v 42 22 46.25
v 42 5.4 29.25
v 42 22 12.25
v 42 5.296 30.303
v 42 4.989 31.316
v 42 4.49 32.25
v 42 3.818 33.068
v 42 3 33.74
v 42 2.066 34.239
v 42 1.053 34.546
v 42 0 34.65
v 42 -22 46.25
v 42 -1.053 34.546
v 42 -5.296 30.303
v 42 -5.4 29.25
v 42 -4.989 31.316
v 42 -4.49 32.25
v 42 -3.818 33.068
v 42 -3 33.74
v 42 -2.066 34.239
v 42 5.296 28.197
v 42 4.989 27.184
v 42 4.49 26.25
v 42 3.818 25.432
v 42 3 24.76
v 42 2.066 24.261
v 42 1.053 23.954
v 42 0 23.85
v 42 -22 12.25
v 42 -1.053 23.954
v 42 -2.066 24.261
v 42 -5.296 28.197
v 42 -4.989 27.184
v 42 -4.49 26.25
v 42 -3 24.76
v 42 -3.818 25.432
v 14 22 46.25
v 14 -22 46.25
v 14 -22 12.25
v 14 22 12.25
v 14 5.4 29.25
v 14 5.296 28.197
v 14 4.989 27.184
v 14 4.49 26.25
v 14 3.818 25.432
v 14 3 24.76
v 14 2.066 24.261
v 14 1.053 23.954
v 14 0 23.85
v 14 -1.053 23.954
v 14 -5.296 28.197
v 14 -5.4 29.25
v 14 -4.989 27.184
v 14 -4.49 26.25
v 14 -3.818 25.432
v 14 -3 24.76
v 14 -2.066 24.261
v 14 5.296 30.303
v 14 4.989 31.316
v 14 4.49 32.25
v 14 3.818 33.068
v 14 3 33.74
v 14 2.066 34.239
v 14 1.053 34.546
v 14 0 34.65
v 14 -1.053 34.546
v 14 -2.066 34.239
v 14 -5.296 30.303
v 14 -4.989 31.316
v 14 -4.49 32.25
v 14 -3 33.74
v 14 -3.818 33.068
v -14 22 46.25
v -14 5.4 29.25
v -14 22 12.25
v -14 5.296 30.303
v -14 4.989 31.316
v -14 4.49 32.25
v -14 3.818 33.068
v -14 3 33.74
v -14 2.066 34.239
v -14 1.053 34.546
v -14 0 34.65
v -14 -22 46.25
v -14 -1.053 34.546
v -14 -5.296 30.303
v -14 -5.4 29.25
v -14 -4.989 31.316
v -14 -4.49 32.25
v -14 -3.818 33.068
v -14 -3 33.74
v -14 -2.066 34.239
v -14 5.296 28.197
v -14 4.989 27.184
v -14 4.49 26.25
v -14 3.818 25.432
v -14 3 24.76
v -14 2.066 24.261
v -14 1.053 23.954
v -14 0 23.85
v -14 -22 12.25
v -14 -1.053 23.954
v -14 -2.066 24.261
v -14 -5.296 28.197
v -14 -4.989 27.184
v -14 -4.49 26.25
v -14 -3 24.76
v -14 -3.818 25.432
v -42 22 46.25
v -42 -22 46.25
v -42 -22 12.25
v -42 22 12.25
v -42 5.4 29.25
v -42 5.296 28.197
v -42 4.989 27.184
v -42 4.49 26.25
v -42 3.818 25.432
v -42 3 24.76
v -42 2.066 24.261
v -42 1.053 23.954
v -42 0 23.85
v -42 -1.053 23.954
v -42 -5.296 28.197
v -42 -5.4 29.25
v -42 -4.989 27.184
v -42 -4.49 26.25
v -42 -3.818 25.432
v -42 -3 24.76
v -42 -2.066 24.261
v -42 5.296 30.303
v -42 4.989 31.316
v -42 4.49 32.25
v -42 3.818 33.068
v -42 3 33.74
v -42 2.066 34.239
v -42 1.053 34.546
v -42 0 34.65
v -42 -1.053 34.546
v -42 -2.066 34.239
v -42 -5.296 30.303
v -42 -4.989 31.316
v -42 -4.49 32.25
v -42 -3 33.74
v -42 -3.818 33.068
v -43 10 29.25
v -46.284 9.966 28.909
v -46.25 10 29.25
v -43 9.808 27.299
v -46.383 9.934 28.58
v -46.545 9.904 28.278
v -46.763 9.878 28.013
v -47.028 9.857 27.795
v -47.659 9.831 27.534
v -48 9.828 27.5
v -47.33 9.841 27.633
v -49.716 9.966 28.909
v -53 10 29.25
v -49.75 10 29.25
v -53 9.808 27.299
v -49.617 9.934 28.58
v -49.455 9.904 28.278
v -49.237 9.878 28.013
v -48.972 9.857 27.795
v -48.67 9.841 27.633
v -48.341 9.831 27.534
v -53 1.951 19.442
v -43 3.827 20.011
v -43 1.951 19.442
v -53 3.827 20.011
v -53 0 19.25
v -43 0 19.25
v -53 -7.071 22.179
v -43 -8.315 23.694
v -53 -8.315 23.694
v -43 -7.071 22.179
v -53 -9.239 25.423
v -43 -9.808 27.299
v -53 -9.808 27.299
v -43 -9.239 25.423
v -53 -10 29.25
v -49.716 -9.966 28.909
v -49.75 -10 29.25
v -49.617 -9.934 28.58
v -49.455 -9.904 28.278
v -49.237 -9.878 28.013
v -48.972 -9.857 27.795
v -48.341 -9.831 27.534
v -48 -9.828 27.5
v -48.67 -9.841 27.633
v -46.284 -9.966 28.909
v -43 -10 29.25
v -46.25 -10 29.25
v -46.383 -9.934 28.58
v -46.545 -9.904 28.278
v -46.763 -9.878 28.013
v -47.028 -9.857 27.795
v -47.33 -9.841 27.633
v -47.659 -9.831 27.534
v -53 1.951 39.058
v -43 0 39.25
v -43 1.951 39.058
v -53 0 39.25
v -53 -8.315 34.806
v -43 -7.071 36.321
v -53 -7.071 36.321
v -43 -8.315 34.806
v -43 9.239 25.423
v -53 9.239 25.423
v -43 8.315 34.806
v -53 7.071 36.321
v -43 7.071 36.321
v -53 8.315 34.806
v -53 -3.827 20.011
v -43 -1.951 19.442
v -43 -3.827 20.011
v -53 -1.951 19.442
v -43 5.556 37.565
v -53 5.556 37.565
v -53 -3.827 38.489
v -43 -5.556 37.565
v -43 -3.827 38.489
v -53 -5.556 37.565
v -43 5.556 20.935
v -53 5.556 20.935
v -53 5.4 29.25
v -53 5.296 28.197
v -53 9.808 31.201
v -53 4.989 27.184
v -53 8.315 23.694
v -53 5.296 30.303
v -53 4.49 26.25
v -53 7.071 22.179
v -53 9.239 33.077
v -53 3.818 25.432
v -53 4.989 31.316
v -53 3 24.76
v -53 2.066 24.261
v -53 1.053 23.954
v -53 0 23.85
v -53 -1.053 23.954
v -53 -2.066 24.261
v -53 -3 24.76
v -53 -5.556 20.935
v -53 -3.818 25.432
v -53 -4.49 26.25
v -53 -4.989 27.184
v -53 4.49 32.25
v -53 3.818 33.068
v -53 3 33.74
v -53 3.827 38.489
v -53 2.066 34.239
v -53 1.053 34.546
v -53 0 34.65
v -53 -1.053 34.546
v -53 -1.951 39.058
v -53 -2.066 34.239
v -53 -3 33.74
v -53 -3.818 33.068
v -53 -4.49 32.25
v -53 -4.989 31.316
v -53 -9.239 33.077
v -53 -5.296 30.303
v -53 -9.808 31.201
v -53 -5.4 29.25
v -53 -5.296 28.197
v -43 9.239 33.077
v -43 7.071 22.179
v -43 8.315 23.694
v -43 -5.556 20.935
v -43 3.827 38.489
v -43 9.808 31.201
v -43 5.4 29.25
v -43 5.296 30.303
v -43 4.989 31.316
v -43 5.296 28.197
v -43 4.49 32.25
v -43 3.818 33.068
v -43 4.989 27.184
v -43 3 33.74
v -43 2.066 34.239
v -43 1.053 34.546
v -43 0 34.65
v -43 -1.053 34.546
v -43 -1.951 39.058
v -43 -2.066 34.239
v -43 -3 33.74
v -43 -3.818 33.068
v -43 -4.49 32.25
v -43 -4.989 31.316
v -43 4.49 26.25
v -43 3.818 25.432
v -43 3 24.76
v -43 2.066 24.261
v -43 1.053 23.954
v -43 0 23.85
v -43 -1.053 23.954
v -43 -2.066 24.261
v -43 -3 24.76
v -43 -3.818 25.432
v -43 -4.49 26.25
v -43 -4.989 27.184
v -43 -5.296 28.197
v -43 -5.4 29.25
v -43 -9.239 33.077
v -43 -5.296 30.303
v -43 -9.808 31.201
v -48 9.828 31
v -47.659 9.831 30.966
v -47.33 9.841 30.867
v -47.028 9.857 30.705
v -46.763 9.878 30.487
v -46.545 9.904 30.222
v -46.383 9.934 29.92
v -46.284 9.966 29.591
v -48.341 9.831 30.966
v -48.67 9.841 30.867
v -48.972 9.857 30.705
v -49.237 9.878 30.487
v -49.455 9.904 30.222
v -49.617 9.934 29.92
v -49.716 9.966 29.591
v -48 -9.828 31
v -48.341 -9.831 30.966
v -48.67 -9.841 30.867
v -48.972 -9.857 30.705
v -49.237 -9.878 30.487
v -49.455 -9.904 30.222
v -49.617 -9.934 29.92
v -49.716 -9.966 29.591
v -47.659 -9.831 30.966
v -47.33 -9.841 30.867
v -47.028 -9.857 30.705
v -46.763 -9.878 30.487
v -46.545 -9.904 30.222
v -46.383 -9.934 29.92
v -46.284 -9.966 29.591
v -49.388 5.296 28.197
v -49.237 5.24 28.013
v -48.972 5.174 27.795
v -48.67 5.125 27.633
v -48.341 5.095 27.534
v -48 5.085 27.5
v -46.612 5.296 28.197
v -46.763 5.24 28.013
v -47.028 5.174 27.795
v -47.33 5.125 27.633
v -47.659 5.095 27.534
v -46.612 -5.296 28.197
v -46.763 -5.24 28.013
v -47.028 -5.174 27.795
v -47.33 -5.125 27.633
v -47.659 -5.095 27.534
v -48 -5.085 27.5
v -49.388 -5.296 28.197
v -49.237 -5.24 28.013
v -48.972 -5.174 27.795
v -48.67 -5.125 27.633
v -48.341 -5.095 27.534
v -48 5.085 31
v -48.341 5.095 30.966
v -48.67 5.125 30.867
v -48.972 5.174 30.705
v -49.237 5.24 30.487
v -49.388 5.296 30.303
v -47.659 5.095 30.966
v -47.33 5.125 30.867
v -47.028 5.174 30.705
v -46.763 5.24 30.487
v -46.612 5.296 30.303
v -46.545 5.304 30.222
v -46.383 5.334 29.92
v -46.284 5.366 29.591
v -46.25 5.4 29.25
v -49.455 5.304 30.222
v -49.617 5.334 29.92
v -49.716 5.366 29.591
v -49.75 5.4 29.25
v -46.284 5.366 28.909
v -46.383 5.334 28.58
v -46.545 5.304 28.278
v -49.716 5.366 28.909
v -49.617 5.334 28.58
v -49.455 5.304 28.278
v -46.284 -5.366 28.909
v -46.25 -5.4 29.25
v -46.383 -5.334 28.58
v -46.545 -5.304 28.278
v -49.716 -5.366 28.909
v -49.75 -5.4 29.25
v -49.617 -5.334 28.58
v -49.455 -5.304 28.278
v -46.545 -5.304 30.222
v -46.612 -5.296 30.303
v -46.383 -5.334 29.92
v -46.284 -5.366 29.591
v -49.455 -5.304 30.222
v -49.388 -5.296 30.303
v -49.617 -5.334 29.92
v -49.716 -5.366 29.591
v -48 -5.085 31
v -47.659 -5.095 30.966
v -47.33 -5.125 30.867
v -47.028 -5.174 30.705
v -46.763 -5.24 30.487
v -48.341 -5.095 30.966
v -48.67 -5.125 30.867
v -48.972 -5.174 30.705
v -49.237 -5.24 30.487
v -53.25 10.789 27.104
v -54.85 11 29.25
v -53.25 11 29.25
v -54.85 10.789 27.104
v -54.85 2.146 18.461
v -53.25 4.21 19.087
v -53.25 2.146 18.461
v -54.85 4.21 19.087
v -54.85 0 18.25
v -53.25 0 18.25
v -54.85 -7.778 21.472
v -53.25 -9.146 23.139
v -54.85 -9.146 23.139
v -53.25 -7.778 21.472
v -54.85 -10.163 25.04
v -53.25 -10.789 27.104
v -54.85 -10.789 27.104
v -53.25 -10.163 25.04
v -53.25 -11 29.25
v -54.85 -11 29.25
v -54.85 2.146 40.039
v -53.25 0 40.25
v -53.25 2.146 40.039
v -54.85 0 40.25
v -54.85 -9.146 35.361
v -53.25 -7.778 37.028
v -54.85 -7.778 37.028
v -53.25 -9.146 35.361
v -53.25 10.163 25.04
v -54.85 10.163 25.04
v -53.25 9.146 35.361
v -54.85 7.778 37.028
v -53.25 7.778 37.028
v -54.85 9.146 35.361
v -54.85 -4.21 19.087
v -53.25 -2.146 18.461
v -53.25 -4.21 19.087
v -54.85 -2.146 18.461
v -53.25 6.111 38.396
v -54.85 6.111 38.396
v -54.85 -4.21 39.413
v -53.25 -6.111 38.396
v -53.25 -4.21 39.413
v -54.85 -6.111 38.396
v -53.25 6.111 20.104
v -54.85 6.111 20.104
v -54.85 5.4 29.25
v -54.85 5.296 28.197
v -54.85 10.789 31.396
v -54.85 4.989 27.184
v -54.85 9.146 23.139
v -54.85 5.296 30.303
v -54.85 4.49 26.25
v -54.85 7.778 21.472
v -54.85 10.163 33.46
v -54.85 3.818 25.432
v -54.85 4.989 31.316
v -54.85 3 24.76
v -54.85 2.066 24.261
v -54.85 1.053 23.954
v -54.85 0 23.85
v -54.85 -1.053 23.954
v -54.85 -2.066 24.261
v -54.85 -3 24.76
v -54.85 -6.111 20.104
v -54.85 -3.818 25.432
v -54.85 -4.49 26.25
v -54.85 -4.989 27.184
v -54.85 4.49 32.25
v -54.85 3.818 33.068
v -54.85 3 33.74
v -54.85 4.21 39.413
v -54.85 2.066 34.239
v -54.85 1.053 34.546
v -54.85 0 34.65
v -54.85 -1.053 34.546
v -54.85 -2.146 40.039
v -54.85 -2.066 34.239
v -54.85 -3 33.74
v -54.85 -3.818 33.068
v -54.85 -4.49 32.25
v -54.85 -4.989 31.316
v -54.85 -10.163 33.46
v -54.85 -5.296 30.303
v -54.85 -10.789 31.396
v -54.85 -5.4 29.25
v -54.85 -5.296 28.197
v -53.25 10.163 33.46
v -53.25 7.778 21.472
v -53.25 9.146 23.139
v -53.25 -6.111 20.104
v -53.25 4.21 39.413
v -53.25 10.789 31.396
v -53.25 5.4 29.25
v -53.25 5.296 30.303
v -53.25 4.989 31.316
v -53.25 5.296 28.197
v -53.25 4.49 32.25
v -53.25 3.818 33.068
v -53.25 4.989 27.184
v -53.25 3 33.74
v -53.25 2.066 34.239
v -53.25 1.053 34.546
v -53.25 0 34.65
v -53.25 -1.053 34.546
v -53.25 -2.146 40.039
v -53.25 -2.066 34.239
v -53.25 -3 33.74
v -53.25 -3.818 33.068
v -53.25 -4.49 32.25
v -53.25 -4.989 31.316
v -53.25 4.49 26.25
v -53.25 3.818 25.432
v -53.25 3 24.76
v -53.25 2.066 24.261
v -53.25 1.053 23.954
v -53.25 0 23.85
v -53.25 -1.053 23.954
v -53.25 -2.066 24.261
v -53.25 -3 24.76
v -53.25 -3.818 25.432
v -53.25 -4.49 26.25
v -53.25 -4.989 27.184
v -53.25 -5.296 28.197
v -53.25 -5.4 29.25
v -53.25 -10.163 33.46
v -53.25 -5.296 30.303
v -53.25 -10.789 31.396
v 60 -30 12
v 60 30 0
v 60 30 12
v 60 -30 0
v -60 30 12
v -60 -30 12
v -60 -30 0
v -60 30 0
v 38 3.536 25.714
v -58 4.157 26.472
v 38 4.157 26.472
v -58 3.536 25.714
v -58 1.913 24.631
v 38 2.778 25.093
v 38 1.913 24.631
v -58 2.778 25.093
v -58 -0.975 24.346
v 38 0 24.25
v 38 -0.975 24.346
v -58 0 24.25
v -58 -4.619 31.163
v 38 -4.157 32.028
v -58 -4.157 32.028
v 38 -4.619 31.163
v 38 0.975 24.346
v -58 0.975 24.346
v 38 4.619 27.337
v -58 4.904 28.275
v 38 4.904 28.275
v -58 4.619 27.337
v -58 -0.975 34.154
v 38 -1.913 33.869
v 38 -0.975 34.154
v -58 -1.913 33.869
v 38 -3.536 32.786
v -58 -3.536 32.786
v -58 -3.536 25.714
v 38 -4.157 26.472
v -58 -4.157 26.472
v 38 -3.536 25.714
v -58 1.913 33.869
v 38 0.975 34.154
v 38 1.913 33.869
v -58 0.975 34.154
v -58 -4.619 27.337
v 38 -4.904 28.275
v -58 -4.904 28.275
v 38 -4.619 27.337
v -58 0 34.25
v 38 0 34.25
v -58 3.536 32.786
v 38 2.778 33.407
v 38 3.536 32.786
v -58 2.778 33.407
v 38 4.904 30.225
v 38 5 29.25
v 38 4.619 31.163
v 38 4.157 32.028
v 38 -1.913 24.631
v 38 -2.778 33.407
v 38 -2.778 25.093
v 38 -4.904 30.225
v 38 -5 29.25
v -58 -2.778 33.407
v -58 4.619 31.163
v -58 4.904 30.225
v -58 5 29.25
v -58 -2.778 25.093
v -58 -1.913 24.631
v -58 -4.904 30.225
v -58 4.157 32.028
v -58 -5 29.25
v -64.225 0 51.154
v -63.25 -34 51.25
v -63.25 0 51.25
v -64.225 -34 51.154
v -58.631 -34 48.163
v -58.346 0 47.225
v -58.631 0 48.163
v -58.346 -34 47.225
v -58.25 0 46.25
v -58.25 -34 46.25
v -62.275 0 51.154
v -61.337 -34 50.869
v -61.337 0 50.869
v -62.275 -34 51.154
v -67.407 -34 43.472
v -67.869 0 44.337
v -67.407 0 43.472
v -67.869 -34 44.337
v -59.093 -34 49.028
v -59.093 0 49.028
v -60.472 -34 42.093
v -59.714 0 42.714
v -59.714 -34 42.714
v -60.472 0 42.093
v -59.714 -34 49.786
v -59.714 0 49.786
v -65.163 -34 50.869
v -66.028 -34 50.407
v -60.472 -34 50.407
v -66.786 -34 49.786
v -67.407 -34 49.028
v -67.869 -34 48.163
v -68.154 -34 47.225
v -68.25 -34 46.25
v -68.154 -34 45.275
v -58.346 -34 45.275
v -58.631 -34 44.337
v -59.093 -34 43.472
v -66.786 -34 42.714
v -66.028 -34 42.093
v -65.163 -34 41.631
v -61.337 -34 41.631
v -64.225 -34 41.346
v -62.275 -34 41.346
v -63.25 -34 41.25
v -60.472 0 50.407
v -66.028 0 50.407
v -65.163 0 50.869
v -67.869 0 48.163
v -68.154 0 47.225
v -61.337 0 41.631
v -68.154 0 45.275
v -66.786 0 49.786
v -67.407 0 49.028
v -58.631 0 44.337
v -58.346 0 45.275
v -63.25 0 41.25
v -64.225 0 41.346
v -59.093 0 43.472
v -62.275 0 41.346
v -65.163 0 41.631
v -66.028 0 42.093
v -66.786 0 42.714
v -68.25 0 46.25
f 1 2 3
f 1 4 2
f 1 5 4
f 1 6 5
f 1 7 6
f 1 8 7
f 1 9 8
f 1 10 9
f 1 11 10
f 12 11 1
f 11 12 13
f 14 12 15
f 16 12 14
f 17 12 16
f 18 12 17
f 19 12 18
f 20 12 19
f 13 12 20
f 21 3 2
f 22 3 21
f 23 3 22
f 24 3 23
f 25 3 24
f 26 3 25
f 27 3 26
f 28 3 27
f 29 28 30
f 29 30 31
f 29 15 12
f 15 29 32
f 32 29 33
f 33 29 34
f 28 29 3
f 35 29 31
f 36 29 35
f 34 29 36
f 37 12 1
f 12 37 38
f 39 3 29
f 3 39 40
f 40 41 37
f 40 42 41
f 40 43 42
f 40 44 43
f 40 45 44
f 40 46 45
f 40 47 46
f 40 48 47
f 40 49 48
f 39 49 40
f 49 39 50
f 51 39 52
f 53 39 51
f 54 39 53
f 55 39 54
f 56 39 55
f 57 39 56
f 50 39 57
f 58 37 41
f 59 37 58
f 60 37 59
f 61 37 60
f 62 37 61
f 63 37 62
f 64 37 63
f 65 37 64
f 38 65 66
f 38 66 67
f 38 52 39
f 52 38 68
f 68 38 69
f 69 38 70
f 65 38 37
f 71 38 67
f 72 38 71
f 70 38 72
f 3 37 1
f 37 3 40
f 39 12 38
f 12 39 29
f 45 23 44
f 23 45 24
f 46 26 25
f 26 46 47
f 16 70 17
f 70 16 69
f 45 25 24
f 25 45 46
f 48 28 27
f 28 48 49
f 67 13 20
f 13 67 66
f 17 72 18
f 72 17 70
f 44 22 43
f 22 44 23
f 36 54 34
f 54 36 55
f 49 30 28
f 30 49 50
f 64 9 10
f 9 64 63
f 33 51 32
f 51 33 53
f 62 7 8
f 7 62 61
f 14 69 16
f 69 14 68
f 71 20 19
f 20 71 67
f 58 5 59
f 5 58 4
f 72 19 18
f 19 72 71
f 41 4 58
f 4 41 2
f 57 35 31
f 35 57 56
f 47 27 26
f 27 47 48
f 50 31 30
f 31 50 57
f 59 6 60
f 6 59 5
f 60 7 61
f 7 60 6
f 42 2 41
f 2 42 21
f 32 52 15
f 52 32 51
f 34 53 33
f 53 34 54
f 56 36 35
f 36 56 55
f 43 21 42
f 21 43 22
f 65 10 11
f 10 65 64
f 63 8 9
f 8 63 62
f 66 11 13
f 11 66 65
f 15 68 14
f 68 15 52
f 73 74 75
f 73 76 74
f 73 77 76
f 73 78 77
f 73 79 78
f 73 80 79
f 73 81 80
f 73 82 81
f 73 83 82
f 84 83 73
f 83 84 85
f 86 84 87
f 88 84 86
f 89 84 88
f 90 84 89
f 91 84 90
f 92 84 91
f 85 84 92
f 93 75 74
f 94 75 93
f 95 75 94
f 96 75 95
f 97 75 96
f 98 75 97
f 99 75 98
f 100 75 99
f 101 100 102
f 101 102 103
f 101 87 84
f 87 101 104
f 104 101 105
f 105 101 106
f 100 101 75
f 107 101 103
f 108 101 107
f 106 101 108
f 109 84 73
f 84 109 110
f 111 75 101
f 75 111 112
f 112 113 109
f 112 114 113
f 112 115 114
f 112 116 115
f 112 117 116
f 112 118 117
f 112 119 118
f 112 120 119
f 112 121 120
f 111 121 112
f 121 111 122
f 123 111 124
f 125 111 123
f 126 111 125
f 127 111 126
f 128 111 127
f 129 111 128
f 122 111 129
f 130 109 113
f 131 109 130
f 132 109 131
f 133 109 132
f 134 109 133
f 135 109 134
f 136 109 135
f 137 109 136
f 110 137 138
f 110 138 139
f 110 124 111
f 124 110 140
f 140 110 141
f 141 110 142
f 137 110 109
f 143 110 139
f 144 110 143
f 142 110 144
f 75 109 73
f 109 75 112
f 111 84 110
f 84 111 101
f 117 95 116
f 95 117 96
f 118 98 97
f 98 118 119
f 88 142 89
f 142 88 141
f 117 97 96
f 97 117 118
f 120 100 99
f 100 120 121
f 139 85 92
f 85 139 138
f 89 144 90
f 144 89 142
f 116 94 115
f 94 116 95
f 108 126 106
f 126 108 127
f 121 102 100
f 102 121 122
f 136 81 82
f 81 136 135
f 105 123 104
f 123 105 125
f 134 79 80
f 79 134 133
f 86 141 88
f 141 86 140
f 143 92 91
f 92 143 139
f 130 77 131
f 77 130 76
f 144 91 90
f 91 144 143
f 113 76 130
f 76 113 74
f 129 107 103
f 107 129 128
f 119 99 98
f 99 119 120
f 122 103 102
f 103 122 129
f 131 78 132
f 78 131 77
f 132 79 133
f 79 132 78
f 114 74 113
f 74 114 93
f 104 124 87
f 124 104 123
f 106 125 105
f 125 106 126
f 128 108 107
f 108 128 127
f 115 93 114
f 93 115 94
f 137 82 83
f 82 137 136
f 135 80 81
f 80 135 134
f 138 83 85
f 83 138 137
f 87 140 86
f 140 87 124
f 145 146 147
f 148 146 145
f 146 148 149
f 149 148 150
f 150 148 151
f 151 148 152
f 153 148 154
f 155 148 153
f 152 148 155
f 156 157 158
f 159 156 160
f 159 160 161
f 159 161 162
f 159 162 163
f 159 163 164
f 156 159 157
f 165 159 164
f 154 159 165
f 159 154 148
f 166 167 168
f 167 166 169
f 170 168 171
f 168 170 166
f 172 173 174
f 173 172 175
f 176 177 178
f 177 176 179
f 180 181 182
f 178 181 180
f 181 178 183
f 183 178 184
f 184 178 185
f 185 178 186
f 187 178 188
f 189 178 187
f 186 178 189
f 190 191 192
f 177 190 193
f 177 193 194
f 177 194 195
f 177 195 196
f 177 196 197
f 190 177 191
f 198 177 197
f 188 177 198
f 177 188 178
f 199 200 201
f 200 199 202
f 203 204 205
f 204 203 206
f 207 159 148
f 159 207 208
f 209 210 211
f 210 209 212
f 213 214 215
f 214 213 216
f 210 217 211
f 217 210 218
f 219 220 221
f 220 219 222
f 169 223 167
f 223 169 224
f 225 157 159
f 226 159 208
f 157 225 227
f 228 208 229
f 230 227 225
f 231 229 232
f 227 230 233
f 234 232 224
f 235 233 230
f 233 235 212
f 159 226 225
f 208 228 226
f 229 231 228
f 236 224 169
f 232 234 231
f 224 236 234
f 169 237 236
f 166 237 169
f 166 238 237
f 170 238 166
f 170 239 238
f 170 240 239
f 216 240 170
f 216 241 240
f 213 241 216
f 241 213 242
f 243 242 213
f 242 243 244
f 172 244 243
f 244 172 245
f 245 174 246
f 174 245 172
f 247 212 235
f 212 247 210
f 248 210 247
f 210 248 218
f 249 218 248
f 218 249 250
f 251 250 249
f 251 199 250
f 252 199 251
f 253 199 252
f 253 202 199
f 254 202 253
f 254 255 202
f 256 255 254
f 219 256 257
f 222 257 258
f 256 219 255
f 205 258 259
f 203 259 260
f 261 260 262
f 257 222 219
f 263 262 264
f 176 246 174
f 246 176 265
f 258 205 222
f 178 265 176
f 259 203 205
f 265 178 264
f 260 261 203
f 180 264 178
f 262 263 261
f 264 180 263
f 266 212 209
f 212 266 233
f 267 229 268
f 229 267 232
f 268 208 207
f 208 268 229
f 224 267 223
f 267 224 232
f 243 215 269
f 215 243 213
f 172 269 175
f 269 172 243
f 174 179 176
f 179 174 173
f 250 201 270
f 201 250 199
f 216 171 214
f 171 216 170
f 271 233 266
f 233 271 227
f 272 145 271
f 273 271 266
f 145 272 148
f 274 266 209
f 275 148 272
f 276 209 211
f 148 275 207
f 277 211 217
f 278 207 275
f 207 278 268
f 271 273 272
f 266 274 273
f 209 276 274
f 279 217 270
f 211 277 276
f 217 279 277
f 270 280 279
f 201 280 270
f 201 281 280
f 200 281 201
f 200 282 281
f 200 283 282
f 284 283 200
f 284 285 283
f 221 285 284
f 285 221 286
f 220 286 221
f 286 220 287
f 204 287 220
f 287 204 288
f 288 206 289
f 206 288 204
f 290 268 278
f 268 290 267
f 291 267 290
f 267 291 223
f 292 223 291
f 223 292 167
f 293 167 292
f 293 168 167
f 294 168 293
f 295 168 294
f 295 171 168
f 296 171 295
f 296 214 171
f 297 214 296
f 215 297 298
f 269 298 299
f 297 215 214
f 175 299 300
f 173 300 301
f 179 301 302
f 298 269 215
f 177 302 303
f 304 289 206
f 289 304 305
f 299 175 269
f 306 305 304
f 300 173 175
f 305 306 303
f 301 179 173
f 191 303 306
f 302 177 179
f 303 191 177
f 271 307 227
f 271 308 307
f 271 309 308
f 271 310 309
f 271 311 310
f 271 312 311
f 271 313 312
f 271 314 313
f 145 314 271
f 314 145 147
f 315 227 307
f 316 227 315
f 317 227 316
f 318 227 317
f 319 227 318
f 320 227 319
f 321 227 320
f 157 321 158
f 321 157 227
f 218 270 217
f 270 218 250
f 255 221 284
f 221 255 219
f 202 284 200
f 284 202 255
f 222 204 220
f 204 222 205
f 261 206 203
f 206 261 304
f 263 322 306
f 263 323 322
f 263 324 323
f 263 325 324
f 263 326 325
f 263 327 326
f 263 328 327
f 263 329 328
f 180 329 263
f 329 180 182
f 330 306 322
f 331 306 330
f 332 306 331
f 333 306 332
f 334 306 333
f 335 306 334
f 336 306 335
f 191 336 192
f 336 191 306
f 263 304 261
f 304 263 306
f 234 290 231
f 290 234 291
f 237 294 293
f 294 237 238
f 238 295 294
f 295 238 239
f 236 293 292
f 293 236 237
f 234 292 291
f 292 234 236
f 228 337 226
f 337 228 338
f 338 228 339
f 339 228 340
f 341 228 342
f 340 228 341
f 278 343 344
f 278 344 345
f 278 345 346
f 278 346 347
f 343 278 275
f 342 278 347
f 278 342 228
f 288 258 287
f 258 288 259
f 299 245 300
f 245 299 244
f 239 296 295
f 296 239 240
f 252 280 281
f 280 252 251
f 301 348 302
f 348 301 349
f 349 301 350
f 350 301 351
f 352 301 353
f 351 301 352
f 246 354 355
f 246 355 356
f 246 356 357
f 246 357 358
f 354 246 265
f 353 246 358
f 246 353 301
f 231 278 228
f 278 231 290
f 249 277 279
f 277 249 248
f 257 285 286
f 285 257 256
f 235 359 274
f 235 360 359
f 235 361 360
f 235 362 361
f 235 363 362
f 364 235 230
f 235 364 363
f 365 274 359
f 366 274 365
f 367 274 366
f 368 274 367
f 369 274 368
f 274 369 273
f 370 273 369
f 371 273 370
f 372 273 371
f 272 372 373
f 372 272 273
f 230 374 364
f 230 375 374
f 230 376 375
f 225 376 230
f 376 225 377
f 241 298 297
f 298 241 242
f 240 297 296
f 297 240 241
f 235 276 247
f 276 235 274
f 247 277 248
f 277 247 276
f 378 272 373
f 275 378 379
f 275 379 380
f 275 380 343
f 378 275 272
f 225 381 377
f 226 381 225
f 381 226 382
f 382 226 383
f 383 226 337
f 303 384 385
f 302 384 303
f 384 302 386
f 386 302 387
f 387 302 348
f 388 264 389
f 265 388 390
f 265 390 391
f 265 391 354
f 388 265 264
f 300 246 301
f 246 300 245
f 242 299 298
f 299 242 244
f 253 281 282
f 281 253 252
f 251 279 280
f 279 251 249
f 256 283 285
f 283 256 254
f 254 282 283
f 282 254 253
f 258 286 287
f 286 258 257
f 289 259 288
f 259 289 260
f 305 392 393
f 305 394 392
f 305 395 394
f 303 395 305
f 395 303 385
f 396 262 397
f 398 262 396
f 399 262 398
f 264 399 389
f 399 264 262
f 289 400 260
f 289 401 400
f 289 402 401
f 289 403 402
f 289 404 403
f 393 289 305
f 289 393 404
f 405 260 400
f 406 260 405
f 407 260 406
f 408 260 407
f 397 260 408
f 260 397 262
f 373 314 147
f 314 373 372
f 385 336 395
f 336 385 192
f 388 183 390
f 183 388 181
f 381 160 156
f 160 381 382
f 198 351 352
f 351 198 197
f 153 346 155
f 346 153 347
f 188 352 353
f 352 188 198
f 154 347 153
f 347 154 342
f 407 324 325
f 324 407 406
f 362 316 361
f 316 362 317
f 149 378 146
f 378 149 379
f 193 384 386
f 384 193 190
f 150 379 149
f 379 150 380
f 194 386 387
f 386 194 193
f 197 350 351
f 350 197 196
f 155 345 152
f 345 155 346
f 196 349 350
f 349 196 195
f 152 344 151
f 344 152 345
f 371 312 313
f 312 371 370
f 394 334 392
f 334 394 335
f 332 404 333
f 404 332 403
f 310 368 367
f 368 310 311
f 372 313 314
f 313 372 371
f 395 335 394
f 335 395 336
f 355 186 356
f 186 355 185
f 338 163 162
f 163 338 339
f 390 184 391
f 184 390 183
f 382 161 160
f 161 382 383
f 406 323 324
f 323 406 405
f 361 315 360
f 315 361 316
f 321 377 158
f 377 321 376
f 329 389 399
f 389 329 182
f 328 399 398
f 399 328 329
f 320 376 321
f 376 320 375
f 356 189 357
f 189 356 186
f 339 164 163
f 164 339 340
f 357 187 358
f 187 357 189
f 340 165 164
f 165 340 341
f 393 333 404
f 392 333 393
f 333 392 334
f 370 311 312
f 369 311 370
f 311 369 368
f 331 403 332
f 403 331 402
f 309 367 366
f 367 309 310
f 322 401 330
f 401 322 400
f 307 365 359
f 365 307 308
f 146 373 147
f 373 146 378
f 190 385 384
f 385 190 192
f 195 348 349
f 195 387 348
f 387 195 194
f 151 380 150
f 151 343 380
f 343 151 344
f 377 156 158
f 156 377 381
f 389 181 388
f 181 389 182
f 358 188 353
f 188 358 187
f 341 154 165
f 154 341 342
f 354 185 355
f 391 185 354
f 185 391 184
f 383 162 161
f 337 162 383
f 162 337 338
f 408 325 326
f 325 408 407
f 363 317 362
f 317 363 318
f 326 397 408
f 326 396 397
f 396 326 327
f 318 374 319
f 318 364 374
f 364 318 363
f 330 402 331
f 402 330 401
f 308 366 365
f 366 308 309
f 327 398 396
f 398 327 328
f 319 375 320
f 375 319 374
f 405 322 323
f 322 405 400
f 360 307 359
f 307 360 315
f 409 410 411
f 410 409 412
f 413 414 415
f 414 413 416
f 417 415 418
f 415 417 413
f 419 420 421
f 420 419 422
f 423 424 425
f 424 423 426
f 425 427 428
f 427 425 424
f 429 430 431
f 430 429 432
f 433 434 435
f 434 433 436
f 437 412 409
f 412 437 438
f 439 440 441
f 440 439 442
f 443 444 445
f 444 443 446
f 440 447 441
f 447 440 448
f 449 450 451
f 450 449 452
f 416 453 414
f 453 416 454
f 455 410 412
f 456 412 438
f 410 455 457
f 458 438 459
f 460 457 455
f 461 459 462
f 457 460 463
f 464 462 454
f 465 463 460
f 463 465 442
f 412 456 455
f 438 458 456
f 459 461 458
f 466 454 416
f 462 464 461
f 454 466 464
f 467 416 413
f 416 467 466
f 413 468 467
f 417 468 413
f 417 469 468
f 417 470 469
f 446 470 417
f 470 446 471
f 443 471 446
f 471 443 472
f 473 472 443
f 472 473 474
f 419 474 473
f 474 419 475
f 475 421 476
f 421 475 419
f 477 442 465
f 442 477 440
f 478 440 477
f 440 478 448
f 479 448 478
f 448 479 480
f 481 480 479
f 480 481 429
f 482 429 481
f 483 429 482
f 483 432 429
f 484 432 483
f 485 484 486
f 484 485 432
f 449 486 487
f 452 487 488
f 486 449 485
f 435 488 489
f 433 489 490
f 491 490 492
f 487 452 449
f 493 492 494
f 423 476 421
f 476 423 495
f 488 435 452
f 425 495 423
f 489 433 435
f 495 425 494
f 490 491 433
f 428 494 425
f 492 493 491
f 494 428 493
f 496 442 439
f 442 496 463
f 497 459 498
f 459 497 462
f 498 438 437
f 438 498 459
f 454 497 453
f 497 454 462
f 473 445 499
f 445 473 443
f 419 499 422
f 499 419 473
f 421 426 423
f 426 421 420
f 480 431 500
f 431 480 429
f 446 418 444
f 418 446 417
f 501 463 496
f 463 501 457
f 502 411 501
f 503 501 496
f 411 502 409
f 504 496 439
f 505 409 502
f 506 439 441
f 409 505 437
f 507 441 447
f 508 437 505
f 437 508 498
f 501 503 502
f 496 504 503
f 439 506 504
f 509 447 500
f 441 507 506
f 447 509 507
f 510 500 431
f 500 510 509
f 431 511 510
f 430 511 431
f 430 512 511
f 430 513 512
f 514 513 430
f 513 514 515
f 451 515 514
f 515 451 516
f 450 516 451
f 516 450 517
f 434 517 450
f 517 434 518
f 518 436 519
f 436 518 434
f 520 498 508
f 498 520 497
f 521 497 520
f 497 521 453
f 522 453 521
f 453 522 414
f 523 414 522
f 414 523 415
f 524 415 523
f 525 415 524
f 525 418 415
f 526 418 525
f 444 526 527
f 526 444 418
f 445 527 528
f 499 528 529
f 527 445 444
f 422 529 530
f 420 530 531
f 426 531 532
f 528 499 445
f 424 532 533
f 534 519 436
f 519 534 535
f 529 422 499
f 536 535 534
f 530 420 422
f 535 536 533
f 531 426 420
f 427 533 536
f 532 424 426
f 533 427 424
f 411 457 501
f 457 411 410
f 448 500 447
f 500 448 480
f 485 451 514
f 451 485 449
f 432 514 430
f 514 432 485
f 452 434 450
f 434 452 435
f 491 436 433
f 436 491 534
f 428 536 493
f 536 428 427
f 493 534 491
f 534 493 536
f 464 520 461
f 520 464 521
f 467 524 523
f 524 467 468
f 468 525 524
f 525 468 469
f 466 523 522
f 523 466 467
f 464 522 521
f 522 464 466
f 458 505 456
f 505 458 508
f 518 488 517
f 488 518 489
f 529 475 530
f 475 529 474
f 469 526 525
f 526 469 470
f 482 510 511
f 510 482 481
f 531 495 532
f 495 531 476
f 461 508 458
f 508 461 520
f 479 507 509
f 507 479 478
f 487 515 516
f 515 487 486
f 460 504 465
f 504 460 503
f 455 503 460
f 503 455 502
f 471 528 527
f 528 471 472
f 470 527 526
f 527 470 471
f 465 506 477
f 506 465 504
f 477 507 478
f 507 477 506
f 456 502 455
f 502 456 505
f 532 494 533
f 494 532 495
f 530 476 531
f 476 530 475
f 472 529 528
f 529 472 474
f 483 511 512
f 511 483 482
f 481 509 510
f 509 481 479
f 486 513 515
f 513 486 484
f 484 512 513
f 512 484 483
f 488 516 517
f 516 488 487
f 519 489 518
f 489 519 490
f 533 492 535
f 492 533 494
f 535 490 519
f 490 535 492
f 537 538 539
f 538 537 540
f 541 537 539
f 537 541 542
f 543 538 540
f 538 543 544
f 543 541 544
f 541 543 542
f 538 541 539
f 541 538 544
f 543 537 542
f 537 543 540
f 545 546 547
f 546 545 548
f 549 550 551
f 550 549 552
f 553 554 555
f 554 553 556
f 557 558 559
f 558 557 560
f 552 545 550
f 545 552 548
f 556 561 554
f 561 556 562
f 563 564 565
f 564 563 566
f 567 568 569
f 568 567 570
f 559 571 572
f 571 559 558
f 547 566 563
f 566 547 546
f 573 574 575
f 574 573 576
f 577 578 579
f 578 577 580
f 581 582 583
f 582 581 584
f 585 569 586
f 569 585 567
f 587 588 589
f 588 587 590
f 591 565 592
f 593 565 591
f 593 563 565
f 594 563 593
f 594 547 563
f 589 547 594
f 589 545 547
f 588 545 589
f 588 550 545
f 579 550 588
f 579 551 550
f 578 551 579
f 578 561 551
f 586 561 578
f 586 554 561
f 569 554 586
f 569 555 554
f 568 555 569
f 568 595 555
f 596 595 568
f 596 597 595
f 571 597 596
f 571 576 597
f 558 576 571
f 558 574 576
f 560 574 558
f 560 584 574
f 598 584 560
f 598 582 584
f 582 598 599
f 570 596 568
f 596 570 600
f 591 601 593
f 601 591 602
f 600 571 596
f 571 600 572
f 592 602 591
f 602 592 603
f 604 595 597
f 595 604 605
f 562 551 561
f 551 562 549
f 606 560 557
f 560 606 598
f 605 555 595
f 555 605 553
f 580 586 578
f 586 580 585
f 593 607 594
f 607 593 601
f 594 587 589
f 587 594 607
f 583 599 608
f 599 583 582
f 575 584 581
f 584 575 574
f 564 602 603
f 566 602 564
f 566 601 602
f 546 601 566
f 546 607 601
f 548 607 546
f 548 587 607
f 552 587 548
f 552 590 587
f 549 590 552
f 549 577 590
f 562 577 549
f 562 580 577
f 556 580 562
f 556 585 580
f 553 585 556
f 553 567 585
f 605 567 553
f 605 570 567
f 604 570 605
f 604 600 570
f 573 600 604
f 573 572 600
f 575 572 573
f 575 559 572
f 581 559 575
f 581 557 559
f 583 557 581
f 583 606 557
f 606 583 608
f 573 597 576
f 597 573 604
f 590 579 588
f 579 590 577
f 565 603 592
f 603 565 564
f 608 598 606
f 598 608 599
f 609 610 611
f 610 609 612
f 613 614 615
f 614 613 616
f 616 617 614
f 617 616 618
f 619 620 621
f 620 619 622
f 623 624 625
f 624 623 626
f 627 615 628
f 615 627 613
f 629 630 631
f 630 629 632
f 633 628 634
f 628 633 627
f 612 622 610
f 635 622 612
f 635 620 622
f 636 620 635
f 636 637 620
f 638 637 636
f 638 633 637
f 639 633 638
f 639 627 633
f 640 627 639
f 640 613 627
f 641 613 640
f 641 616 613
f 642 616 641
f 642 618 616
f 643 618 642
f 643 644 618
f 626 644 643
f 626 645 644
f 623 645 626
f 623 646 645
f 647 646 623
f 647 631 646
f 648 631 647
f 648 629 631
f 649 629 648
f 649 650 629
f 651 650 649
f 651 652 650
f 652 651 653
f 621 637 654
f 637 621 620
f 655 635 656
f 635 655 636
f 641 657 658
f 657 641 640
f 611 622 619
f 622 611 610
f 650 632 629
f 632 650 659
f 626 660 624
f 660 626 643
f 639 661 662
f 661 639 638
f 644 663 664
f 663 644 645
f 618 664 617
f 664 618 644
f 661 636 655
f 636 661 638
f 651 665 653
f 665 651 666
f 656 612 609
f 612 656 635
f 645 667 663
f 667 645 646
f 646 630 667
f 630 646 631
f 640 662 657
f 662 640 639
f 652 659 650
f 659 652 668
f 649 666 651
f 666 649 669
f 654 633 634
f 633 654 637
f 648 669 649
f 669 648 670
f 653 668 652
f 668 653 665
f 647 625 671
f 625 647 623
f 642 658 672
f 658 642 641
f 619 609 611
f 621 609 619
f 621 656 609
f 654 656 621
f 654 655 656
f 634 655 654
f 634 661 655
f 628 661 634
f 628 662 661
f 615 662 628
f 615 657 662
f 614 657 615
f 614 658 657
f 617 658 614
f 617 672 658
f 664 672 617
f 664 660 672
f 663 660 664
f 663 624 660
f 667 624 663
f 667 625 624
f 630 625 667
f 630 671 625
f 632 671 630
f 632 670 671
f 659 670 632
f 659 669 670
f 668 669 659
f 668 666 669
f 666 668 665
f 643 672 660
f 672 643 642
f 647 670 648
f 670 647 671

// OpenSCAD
$fn = 32;

// ------------------------------------------------------------------------
// Machine vise: screw d10, jaws 28 x 34 mm
// Every part is its own module, assembly() places every instance.
// ------------------------------------------------------------------------

// --- part 1 ---
module vise_bed() {
  difference() {
    translate([-60, -30, 0]) cube([120, 60, 12]);
  }
}

// --- part 2 ---
module vise_jaw() {
  difference() {
    translate([-14, -22, 0]) cube([28, 44, 34]);
    translate([0, 0, 17]) rotate([0, 90, 0]) cylinder(h = 30, d = 10.8, center = true);
  }
}

// --- part 3 ---
module vise_screw() {
  translate([0, 0, -48]) cylinder(h = 96, d = 10);
}

// --- part 4 ---
module screw_collar() {
  difference() {
    cylinder(h = 10, d = 20);
    translate([0, 0, -1]) cylinder(h = 12, d = 10.8);
    translate([0, 0, 5]) rotate([90, 0, 0]) cylinder(h = 22, d = 3.5, center = true);
  }
}

// --- part 5 ---
module screw_washer() {
  difference() {
      translate([0, 0, 0]) cylinder(h = 1.6, d = 22);
      translate([0, 0, -1]) cylinder(h = 3.6, d = 10.8);
    }
}

// --- part 6 ---
module vise_handle() {
  cylinder(h = 34, d = 10);
}

// --- assembly ---
module assembly() {
  color([0.80, 0.24, 0.20]) translate([0, 0, 0]) rotate([0, 0, 0]) vise_bed();
  color([0.20, 0.45, 0.75]) translate([28, 0, 12.25]) rotate([0, 0, 0]) vise_jaw();
  color([0.25, 0.62, 0.32]) translate([-28, 0, 12.25]) rotate([0, 0, 0]) vise_jaw();
  color([0.92, 0.70, 0.18]) translate([-10, 0, 29.25]) rotate([0, 90, 0]) vise_screw();
  color([0.58, 0.35, 0.70]) translate([-53, 0, 29.25]) rotate([0, 90, 0]) screw_collar();
  color([0.16, 0.66, 0.66]) translate([-54.85, 0, 29.25]) rotate([0, 90, 0]) screw_washer();
  color([0.85, 0.48, 0.18]) translate([-63.25, 0, 46.25]) rotate([90, 0, 0]) vise_handle();
}

assembly();
